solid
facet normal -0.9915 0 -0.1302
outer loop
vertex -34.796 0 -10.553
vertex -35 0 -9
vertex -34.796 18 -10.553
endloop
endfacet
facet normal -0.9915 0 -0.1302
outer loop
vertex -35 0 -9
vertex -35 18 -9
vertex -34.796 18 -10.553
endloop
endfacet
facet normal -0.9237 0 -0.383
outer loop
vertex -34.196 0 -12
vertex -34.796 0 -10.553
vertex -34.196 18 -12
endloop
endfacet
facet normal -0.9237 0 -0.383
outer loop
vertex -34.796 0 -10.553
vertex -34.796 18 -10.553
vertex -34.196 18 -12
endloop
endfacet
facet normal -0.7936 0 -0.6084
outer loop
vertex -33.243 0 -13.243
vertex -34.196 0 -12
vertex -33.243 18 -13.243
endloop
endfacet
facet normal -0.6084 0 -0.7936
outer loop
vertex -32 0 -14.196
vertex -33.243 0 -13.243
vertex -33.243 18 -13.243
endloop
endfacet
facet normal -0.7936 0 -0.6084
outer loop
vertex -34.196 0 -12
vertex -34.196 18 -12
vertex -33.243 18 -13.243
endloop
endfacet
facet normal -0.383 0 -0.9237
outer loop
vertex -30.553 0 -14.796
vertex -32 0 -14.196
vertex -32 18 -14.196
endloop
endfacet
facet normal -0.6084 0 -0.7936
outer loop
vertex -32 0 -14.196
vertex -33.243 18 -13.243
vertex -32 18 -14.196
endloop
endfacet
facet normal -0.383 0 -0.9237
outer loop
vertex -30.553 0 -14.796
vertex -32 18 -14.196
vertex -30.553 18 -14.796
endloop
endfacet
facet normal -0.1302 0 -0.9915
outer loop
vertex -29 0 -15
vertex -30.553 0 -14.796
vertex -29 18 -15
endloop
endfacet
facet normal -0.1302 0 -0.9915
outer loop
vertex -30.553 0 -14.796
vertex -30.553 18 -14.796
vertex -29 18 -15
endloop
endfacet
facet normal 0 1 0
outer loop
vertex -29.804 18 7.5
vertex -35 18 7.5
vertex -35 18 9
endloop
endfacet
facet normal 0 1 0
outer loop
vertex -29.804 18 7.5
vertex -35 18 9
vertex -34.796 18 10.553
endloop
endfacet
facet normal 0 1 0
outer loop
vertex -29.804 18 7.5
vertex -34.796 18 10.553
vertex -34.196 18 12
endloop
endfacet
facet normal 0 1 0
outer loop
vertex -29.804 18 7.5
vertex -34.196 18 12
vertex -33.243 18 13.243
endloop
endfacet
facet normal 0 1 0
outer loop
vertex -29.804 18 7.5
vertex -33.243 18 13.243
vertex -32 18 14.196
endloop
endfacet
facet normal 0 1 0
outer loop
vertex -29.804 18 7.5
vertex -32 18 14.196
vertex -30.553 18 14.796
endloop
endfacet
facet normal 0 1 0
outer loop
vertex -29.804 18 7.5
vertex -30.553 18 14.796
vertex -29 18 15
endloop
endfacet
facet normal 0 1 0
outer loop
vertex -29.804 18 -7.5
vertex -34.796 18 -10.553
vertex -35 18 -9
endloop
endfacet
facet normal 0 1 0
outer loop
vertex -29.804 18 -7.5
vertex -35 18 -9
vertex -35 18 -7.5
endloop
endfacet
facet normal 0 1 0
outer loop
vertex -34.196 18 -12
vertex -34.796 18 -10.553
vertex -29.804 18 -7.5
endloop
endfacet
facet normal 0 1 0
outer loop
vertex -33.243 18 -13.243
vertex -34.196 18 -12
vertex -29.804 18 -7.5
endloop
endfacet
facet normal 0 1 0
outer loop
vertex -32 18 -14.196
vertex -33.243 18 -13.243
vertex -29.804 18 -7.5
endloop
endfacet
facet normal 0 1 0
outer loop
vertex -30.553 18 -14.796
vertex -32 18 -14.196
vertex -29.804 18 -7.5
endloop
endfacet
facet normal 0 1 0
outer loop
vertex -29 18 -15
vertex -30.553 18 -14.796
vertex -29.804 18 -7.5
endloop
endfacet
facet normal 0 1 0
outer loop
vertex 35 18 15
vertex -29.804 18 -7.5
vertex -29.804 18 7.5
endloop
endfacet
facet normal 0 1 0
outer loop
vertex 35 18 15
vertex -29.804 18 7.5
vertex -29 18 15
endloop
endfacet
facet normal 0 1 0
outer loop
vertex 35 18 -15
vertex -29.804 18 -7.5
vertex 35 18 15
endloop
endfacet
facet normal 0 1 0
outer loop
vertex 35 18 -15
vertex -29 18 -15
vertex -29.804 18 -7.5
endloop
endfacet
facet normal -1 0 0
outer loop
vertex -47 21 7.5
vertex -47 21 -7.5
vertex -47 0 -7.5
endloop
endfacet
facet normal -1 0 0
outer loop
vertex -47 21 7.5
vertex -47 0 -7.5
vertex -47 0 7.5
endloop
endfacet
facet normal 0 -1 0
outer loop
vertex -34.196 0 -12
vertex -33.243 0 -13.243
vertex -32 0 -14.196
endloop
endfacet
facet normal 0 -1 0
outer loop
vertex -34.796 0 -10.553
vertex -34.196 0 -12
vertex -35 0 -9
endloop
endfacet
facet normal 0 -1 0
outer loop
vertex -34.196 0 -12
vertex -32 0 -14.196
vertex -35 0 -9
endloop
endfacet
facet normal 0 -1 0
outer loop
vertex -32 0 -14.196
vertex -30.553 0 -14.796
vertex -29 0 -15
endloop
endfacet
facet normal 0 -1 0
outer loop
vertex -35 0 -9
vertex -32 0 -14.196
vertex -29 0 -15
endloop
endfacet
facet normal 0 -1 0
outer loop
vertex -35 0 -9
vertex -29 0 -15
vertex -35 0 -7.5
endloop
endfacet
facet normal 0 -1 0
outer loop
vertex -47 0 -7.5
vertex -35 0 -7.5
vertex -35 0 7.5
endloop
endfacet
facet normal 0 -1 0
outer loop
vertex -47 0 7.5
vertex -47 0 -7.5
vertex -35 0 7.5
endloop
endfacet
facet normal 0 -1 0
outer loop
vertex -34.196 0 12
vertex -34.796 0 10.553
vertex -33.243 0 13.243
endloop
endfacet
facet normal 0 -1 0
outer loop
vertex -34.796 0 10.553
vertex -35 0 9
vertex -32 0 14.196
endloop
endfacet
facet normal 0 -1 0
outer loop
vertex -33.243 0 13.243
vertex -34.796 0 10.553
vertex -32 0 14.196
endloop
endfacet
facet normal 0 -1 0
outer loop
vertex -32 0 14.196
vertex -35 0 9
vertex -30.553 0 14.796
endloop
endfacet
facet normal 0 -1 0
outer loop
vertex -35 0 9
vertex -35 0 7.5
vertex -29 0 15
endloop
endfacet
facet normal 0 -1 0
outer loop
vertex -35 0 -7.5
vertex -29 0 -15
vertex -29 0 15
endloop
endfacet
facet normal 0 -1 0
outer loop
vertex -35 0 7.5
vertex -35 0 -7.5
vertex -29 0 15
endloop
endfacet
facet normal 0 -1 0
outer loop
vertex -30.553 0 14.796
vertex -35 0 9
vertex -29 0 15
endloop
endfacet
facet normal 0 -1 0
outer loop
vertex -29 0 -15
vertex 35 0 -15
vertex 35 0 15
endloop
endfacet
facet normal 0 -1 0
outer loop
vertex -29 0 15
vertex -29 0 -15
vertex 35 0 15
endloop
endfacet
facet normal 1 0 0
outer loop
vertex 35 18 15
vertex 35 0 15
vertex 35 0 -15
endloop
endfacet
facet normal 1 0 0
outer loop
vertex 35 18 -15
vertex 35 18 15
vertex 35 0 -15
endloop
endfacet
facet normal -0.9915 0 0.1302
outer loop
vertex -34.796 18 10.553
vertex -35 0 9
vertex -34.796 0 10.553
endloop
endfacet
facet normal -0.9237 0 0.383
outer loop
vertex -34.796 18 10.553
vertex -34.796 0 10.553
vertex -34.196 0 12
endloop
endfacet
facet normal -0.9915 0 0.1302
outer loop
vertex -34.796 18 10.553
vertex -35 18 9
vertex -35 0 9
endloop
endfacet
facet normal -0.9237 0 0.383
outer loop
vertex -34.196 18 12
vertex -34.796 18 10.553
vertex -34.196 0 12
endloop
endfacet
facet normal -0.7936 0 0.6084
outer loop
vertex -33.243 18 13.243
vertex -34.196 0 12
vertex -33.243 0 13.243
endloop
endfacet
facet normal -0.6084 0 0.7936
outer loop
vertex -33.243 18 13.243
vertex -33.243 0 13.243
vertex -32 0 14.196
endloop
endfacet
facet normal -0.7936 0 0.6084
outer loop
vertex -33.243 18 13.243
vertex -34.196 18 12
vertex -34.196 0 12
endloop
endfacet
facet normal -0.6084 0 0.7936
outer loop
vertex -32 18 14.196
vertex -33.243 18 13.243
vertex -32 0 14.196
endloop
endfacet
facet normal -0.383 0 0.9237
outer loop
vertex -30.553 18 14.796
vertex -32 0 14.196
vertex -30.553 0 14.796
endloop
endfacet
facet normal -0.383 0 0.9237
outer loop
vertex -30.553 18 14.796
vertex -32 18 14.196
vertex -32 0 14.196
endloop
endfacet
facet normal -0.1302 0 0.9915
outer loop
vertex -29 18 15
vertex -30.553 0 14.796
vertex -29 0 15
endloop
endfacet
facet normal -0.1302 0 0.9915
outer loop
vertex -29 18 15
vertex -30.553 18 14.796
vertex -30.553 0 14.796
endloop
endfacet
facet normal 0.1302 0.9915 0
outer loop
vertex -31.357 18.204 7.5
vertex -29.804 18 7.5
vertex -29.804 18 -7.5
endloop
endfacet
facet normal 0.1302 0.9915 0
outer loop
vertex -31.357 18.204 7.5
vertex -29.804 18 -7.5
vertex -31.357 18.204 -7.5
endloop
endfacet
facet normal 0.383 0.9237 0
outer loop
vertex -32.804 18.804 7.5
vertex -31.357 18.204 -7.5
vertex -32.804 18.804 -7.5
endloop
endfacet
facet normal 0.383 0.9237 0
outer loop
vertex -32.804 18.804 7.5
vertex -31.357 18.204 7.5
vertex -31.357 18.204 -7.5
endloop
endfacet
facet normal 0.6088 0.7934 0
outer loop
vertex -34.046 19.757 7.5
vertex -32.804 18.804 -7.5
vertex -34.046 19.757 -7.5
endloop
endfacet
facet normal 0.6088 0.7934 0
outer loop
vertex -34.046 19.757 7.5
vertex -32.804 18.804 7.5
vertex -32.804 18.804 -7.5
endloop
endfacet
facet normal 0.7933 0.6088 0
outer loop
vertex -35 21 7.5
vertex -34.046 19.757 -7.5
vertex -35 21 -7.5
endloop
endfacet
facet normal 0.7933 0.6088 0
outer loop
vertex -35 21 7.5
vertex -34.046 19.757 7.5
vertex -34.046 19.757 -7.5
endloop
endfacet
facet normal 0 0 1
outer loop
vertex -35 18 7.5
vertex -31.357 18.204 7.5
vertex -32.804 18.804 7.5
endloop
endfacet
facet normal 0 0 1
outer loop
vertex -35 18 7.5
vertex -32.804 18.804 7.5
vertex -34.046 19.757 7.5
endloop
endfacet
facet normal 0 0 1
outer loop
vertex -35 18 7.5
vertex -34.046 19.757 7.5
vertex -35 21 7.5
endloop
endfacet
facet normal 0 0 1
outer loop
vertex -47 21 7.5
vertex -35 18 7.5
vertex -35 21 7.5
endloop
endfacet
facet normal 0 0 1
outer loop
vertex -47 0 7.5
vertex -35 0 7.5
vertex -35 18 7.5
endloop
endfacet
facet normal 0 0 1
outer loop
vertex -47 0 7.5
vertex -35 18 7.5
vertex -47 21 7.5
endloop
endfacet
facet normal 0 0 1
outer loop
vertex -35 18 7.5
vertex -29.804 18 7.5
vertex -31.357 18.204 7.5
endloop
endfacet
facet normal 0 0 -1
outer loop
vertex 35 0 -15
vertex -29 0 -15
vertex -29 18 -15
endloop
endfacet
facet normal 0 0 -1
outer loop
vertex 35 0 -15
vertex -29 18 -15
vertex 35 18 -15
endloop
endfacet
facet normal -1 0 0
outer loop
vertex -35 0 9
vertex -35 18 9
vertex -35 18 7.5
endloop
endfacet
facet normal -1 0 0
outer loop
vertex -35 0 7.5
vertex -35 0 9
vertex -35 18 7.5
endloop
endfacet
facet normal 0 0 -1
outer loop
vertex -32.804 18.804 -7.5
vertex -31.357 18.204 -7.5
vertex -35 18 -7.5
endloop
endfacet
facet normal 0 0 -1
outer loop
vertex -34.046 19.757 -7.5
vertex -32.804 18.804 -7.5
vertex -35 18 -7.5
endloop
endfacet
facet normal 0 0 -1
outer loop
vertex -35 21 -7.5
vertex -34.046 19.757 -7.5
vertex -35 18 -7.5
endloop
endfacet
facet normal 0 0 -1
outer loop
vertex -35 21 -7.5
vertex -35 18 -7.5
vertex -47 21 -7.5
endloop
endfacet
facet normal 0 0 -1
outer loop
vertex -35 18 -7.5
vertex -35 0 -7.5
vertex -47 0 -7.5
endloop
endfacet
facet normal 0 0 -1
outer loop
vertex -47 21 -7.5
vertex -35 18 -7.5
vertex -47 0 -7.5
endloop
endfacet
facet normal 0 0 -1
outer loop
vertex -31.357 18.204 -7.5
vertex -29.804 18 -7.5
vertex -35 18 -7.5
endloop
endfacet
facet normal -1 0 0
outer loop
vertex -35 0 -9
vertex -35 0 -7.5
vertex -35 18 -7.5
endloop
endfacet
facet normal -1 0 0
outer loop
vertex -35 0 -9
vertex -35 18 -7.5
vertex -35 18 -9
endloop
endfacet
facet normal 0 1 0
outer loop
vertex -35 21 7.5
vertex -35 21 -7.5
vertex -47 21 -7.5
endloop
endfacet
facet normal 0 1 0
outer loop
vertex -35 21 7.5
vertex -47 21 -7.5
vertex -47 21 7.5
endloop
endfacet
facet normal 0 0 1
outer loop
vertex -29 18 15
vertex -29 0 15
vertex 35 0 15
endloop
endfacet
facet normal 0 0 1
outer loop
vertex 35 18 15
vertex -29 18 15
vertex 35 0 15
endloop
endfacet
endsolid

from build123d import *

# Parameters (mm, degrees)
SKETCH_1_W      = 70
SKETCH_1_H      = 30
EXTRUDE_1_DEPTH = 18
FILLET_1_R      = 6
SKETCH_2_W      = 15
SKETCH_2_H      = 3
SKETCH_2_H_2    = 18
EXTRUDE_2_DEPTH = 12
FILLET_2_R      = 6


with BuildPart() as part:
    # 草图1 → 凸台-拉伸1 (new body)
    with BuildSketch(Plane(origin=(0, 0, 0), x_dir=(1, 0, 0), z_dir=(0, 1, 0))):
        Rectangle(SKETCH_1_W, SKETCH_1_H)
    extrude(amount=EXTRUDE_1_DEPTH)

    # 圆角1
    fillet_1_edges = [part.edges().sort_by_distance(p)[0] for p in [
        (-35, 9, 15),
        (-35, 9, -15),
    ]]
    fillet(fillet_1_edges, radius=FILLET_1_R)

    # 草图2 → 凸台-拉伸2 (add)
    with BuildSketch(Plane.ZY.offset(35)):
        with Locations((0, 19.5)):
            Rectangle(SKETCH_2_W, SKETCH_2_H)
        with Locations((0, 9)):
            Rectangle(SKETCH_2_W, SKETCH_2_H_2)
    extrude(amount=EXTRUDE_2_DEPTH)

    # 圆角2
    # the kernel refuses this fillet: 6 mm, written as the material it adds along each edge
    with BuildSketch(Plane(origin=(-35, 18, 7.5), x_dir=(1, 0, 0), z_dir=(0, 0, -1))) as fillet_2_piece_1:
        with BuildLine():
            CenterArc((5.196152423, -6), FILLET_2_R, 90, 60)
            Line((0, -3), (0, 0))
            Line((0, 0), (5.196152423, 0))
        make_face()
    extrude(amount=15)


solid = part.part
